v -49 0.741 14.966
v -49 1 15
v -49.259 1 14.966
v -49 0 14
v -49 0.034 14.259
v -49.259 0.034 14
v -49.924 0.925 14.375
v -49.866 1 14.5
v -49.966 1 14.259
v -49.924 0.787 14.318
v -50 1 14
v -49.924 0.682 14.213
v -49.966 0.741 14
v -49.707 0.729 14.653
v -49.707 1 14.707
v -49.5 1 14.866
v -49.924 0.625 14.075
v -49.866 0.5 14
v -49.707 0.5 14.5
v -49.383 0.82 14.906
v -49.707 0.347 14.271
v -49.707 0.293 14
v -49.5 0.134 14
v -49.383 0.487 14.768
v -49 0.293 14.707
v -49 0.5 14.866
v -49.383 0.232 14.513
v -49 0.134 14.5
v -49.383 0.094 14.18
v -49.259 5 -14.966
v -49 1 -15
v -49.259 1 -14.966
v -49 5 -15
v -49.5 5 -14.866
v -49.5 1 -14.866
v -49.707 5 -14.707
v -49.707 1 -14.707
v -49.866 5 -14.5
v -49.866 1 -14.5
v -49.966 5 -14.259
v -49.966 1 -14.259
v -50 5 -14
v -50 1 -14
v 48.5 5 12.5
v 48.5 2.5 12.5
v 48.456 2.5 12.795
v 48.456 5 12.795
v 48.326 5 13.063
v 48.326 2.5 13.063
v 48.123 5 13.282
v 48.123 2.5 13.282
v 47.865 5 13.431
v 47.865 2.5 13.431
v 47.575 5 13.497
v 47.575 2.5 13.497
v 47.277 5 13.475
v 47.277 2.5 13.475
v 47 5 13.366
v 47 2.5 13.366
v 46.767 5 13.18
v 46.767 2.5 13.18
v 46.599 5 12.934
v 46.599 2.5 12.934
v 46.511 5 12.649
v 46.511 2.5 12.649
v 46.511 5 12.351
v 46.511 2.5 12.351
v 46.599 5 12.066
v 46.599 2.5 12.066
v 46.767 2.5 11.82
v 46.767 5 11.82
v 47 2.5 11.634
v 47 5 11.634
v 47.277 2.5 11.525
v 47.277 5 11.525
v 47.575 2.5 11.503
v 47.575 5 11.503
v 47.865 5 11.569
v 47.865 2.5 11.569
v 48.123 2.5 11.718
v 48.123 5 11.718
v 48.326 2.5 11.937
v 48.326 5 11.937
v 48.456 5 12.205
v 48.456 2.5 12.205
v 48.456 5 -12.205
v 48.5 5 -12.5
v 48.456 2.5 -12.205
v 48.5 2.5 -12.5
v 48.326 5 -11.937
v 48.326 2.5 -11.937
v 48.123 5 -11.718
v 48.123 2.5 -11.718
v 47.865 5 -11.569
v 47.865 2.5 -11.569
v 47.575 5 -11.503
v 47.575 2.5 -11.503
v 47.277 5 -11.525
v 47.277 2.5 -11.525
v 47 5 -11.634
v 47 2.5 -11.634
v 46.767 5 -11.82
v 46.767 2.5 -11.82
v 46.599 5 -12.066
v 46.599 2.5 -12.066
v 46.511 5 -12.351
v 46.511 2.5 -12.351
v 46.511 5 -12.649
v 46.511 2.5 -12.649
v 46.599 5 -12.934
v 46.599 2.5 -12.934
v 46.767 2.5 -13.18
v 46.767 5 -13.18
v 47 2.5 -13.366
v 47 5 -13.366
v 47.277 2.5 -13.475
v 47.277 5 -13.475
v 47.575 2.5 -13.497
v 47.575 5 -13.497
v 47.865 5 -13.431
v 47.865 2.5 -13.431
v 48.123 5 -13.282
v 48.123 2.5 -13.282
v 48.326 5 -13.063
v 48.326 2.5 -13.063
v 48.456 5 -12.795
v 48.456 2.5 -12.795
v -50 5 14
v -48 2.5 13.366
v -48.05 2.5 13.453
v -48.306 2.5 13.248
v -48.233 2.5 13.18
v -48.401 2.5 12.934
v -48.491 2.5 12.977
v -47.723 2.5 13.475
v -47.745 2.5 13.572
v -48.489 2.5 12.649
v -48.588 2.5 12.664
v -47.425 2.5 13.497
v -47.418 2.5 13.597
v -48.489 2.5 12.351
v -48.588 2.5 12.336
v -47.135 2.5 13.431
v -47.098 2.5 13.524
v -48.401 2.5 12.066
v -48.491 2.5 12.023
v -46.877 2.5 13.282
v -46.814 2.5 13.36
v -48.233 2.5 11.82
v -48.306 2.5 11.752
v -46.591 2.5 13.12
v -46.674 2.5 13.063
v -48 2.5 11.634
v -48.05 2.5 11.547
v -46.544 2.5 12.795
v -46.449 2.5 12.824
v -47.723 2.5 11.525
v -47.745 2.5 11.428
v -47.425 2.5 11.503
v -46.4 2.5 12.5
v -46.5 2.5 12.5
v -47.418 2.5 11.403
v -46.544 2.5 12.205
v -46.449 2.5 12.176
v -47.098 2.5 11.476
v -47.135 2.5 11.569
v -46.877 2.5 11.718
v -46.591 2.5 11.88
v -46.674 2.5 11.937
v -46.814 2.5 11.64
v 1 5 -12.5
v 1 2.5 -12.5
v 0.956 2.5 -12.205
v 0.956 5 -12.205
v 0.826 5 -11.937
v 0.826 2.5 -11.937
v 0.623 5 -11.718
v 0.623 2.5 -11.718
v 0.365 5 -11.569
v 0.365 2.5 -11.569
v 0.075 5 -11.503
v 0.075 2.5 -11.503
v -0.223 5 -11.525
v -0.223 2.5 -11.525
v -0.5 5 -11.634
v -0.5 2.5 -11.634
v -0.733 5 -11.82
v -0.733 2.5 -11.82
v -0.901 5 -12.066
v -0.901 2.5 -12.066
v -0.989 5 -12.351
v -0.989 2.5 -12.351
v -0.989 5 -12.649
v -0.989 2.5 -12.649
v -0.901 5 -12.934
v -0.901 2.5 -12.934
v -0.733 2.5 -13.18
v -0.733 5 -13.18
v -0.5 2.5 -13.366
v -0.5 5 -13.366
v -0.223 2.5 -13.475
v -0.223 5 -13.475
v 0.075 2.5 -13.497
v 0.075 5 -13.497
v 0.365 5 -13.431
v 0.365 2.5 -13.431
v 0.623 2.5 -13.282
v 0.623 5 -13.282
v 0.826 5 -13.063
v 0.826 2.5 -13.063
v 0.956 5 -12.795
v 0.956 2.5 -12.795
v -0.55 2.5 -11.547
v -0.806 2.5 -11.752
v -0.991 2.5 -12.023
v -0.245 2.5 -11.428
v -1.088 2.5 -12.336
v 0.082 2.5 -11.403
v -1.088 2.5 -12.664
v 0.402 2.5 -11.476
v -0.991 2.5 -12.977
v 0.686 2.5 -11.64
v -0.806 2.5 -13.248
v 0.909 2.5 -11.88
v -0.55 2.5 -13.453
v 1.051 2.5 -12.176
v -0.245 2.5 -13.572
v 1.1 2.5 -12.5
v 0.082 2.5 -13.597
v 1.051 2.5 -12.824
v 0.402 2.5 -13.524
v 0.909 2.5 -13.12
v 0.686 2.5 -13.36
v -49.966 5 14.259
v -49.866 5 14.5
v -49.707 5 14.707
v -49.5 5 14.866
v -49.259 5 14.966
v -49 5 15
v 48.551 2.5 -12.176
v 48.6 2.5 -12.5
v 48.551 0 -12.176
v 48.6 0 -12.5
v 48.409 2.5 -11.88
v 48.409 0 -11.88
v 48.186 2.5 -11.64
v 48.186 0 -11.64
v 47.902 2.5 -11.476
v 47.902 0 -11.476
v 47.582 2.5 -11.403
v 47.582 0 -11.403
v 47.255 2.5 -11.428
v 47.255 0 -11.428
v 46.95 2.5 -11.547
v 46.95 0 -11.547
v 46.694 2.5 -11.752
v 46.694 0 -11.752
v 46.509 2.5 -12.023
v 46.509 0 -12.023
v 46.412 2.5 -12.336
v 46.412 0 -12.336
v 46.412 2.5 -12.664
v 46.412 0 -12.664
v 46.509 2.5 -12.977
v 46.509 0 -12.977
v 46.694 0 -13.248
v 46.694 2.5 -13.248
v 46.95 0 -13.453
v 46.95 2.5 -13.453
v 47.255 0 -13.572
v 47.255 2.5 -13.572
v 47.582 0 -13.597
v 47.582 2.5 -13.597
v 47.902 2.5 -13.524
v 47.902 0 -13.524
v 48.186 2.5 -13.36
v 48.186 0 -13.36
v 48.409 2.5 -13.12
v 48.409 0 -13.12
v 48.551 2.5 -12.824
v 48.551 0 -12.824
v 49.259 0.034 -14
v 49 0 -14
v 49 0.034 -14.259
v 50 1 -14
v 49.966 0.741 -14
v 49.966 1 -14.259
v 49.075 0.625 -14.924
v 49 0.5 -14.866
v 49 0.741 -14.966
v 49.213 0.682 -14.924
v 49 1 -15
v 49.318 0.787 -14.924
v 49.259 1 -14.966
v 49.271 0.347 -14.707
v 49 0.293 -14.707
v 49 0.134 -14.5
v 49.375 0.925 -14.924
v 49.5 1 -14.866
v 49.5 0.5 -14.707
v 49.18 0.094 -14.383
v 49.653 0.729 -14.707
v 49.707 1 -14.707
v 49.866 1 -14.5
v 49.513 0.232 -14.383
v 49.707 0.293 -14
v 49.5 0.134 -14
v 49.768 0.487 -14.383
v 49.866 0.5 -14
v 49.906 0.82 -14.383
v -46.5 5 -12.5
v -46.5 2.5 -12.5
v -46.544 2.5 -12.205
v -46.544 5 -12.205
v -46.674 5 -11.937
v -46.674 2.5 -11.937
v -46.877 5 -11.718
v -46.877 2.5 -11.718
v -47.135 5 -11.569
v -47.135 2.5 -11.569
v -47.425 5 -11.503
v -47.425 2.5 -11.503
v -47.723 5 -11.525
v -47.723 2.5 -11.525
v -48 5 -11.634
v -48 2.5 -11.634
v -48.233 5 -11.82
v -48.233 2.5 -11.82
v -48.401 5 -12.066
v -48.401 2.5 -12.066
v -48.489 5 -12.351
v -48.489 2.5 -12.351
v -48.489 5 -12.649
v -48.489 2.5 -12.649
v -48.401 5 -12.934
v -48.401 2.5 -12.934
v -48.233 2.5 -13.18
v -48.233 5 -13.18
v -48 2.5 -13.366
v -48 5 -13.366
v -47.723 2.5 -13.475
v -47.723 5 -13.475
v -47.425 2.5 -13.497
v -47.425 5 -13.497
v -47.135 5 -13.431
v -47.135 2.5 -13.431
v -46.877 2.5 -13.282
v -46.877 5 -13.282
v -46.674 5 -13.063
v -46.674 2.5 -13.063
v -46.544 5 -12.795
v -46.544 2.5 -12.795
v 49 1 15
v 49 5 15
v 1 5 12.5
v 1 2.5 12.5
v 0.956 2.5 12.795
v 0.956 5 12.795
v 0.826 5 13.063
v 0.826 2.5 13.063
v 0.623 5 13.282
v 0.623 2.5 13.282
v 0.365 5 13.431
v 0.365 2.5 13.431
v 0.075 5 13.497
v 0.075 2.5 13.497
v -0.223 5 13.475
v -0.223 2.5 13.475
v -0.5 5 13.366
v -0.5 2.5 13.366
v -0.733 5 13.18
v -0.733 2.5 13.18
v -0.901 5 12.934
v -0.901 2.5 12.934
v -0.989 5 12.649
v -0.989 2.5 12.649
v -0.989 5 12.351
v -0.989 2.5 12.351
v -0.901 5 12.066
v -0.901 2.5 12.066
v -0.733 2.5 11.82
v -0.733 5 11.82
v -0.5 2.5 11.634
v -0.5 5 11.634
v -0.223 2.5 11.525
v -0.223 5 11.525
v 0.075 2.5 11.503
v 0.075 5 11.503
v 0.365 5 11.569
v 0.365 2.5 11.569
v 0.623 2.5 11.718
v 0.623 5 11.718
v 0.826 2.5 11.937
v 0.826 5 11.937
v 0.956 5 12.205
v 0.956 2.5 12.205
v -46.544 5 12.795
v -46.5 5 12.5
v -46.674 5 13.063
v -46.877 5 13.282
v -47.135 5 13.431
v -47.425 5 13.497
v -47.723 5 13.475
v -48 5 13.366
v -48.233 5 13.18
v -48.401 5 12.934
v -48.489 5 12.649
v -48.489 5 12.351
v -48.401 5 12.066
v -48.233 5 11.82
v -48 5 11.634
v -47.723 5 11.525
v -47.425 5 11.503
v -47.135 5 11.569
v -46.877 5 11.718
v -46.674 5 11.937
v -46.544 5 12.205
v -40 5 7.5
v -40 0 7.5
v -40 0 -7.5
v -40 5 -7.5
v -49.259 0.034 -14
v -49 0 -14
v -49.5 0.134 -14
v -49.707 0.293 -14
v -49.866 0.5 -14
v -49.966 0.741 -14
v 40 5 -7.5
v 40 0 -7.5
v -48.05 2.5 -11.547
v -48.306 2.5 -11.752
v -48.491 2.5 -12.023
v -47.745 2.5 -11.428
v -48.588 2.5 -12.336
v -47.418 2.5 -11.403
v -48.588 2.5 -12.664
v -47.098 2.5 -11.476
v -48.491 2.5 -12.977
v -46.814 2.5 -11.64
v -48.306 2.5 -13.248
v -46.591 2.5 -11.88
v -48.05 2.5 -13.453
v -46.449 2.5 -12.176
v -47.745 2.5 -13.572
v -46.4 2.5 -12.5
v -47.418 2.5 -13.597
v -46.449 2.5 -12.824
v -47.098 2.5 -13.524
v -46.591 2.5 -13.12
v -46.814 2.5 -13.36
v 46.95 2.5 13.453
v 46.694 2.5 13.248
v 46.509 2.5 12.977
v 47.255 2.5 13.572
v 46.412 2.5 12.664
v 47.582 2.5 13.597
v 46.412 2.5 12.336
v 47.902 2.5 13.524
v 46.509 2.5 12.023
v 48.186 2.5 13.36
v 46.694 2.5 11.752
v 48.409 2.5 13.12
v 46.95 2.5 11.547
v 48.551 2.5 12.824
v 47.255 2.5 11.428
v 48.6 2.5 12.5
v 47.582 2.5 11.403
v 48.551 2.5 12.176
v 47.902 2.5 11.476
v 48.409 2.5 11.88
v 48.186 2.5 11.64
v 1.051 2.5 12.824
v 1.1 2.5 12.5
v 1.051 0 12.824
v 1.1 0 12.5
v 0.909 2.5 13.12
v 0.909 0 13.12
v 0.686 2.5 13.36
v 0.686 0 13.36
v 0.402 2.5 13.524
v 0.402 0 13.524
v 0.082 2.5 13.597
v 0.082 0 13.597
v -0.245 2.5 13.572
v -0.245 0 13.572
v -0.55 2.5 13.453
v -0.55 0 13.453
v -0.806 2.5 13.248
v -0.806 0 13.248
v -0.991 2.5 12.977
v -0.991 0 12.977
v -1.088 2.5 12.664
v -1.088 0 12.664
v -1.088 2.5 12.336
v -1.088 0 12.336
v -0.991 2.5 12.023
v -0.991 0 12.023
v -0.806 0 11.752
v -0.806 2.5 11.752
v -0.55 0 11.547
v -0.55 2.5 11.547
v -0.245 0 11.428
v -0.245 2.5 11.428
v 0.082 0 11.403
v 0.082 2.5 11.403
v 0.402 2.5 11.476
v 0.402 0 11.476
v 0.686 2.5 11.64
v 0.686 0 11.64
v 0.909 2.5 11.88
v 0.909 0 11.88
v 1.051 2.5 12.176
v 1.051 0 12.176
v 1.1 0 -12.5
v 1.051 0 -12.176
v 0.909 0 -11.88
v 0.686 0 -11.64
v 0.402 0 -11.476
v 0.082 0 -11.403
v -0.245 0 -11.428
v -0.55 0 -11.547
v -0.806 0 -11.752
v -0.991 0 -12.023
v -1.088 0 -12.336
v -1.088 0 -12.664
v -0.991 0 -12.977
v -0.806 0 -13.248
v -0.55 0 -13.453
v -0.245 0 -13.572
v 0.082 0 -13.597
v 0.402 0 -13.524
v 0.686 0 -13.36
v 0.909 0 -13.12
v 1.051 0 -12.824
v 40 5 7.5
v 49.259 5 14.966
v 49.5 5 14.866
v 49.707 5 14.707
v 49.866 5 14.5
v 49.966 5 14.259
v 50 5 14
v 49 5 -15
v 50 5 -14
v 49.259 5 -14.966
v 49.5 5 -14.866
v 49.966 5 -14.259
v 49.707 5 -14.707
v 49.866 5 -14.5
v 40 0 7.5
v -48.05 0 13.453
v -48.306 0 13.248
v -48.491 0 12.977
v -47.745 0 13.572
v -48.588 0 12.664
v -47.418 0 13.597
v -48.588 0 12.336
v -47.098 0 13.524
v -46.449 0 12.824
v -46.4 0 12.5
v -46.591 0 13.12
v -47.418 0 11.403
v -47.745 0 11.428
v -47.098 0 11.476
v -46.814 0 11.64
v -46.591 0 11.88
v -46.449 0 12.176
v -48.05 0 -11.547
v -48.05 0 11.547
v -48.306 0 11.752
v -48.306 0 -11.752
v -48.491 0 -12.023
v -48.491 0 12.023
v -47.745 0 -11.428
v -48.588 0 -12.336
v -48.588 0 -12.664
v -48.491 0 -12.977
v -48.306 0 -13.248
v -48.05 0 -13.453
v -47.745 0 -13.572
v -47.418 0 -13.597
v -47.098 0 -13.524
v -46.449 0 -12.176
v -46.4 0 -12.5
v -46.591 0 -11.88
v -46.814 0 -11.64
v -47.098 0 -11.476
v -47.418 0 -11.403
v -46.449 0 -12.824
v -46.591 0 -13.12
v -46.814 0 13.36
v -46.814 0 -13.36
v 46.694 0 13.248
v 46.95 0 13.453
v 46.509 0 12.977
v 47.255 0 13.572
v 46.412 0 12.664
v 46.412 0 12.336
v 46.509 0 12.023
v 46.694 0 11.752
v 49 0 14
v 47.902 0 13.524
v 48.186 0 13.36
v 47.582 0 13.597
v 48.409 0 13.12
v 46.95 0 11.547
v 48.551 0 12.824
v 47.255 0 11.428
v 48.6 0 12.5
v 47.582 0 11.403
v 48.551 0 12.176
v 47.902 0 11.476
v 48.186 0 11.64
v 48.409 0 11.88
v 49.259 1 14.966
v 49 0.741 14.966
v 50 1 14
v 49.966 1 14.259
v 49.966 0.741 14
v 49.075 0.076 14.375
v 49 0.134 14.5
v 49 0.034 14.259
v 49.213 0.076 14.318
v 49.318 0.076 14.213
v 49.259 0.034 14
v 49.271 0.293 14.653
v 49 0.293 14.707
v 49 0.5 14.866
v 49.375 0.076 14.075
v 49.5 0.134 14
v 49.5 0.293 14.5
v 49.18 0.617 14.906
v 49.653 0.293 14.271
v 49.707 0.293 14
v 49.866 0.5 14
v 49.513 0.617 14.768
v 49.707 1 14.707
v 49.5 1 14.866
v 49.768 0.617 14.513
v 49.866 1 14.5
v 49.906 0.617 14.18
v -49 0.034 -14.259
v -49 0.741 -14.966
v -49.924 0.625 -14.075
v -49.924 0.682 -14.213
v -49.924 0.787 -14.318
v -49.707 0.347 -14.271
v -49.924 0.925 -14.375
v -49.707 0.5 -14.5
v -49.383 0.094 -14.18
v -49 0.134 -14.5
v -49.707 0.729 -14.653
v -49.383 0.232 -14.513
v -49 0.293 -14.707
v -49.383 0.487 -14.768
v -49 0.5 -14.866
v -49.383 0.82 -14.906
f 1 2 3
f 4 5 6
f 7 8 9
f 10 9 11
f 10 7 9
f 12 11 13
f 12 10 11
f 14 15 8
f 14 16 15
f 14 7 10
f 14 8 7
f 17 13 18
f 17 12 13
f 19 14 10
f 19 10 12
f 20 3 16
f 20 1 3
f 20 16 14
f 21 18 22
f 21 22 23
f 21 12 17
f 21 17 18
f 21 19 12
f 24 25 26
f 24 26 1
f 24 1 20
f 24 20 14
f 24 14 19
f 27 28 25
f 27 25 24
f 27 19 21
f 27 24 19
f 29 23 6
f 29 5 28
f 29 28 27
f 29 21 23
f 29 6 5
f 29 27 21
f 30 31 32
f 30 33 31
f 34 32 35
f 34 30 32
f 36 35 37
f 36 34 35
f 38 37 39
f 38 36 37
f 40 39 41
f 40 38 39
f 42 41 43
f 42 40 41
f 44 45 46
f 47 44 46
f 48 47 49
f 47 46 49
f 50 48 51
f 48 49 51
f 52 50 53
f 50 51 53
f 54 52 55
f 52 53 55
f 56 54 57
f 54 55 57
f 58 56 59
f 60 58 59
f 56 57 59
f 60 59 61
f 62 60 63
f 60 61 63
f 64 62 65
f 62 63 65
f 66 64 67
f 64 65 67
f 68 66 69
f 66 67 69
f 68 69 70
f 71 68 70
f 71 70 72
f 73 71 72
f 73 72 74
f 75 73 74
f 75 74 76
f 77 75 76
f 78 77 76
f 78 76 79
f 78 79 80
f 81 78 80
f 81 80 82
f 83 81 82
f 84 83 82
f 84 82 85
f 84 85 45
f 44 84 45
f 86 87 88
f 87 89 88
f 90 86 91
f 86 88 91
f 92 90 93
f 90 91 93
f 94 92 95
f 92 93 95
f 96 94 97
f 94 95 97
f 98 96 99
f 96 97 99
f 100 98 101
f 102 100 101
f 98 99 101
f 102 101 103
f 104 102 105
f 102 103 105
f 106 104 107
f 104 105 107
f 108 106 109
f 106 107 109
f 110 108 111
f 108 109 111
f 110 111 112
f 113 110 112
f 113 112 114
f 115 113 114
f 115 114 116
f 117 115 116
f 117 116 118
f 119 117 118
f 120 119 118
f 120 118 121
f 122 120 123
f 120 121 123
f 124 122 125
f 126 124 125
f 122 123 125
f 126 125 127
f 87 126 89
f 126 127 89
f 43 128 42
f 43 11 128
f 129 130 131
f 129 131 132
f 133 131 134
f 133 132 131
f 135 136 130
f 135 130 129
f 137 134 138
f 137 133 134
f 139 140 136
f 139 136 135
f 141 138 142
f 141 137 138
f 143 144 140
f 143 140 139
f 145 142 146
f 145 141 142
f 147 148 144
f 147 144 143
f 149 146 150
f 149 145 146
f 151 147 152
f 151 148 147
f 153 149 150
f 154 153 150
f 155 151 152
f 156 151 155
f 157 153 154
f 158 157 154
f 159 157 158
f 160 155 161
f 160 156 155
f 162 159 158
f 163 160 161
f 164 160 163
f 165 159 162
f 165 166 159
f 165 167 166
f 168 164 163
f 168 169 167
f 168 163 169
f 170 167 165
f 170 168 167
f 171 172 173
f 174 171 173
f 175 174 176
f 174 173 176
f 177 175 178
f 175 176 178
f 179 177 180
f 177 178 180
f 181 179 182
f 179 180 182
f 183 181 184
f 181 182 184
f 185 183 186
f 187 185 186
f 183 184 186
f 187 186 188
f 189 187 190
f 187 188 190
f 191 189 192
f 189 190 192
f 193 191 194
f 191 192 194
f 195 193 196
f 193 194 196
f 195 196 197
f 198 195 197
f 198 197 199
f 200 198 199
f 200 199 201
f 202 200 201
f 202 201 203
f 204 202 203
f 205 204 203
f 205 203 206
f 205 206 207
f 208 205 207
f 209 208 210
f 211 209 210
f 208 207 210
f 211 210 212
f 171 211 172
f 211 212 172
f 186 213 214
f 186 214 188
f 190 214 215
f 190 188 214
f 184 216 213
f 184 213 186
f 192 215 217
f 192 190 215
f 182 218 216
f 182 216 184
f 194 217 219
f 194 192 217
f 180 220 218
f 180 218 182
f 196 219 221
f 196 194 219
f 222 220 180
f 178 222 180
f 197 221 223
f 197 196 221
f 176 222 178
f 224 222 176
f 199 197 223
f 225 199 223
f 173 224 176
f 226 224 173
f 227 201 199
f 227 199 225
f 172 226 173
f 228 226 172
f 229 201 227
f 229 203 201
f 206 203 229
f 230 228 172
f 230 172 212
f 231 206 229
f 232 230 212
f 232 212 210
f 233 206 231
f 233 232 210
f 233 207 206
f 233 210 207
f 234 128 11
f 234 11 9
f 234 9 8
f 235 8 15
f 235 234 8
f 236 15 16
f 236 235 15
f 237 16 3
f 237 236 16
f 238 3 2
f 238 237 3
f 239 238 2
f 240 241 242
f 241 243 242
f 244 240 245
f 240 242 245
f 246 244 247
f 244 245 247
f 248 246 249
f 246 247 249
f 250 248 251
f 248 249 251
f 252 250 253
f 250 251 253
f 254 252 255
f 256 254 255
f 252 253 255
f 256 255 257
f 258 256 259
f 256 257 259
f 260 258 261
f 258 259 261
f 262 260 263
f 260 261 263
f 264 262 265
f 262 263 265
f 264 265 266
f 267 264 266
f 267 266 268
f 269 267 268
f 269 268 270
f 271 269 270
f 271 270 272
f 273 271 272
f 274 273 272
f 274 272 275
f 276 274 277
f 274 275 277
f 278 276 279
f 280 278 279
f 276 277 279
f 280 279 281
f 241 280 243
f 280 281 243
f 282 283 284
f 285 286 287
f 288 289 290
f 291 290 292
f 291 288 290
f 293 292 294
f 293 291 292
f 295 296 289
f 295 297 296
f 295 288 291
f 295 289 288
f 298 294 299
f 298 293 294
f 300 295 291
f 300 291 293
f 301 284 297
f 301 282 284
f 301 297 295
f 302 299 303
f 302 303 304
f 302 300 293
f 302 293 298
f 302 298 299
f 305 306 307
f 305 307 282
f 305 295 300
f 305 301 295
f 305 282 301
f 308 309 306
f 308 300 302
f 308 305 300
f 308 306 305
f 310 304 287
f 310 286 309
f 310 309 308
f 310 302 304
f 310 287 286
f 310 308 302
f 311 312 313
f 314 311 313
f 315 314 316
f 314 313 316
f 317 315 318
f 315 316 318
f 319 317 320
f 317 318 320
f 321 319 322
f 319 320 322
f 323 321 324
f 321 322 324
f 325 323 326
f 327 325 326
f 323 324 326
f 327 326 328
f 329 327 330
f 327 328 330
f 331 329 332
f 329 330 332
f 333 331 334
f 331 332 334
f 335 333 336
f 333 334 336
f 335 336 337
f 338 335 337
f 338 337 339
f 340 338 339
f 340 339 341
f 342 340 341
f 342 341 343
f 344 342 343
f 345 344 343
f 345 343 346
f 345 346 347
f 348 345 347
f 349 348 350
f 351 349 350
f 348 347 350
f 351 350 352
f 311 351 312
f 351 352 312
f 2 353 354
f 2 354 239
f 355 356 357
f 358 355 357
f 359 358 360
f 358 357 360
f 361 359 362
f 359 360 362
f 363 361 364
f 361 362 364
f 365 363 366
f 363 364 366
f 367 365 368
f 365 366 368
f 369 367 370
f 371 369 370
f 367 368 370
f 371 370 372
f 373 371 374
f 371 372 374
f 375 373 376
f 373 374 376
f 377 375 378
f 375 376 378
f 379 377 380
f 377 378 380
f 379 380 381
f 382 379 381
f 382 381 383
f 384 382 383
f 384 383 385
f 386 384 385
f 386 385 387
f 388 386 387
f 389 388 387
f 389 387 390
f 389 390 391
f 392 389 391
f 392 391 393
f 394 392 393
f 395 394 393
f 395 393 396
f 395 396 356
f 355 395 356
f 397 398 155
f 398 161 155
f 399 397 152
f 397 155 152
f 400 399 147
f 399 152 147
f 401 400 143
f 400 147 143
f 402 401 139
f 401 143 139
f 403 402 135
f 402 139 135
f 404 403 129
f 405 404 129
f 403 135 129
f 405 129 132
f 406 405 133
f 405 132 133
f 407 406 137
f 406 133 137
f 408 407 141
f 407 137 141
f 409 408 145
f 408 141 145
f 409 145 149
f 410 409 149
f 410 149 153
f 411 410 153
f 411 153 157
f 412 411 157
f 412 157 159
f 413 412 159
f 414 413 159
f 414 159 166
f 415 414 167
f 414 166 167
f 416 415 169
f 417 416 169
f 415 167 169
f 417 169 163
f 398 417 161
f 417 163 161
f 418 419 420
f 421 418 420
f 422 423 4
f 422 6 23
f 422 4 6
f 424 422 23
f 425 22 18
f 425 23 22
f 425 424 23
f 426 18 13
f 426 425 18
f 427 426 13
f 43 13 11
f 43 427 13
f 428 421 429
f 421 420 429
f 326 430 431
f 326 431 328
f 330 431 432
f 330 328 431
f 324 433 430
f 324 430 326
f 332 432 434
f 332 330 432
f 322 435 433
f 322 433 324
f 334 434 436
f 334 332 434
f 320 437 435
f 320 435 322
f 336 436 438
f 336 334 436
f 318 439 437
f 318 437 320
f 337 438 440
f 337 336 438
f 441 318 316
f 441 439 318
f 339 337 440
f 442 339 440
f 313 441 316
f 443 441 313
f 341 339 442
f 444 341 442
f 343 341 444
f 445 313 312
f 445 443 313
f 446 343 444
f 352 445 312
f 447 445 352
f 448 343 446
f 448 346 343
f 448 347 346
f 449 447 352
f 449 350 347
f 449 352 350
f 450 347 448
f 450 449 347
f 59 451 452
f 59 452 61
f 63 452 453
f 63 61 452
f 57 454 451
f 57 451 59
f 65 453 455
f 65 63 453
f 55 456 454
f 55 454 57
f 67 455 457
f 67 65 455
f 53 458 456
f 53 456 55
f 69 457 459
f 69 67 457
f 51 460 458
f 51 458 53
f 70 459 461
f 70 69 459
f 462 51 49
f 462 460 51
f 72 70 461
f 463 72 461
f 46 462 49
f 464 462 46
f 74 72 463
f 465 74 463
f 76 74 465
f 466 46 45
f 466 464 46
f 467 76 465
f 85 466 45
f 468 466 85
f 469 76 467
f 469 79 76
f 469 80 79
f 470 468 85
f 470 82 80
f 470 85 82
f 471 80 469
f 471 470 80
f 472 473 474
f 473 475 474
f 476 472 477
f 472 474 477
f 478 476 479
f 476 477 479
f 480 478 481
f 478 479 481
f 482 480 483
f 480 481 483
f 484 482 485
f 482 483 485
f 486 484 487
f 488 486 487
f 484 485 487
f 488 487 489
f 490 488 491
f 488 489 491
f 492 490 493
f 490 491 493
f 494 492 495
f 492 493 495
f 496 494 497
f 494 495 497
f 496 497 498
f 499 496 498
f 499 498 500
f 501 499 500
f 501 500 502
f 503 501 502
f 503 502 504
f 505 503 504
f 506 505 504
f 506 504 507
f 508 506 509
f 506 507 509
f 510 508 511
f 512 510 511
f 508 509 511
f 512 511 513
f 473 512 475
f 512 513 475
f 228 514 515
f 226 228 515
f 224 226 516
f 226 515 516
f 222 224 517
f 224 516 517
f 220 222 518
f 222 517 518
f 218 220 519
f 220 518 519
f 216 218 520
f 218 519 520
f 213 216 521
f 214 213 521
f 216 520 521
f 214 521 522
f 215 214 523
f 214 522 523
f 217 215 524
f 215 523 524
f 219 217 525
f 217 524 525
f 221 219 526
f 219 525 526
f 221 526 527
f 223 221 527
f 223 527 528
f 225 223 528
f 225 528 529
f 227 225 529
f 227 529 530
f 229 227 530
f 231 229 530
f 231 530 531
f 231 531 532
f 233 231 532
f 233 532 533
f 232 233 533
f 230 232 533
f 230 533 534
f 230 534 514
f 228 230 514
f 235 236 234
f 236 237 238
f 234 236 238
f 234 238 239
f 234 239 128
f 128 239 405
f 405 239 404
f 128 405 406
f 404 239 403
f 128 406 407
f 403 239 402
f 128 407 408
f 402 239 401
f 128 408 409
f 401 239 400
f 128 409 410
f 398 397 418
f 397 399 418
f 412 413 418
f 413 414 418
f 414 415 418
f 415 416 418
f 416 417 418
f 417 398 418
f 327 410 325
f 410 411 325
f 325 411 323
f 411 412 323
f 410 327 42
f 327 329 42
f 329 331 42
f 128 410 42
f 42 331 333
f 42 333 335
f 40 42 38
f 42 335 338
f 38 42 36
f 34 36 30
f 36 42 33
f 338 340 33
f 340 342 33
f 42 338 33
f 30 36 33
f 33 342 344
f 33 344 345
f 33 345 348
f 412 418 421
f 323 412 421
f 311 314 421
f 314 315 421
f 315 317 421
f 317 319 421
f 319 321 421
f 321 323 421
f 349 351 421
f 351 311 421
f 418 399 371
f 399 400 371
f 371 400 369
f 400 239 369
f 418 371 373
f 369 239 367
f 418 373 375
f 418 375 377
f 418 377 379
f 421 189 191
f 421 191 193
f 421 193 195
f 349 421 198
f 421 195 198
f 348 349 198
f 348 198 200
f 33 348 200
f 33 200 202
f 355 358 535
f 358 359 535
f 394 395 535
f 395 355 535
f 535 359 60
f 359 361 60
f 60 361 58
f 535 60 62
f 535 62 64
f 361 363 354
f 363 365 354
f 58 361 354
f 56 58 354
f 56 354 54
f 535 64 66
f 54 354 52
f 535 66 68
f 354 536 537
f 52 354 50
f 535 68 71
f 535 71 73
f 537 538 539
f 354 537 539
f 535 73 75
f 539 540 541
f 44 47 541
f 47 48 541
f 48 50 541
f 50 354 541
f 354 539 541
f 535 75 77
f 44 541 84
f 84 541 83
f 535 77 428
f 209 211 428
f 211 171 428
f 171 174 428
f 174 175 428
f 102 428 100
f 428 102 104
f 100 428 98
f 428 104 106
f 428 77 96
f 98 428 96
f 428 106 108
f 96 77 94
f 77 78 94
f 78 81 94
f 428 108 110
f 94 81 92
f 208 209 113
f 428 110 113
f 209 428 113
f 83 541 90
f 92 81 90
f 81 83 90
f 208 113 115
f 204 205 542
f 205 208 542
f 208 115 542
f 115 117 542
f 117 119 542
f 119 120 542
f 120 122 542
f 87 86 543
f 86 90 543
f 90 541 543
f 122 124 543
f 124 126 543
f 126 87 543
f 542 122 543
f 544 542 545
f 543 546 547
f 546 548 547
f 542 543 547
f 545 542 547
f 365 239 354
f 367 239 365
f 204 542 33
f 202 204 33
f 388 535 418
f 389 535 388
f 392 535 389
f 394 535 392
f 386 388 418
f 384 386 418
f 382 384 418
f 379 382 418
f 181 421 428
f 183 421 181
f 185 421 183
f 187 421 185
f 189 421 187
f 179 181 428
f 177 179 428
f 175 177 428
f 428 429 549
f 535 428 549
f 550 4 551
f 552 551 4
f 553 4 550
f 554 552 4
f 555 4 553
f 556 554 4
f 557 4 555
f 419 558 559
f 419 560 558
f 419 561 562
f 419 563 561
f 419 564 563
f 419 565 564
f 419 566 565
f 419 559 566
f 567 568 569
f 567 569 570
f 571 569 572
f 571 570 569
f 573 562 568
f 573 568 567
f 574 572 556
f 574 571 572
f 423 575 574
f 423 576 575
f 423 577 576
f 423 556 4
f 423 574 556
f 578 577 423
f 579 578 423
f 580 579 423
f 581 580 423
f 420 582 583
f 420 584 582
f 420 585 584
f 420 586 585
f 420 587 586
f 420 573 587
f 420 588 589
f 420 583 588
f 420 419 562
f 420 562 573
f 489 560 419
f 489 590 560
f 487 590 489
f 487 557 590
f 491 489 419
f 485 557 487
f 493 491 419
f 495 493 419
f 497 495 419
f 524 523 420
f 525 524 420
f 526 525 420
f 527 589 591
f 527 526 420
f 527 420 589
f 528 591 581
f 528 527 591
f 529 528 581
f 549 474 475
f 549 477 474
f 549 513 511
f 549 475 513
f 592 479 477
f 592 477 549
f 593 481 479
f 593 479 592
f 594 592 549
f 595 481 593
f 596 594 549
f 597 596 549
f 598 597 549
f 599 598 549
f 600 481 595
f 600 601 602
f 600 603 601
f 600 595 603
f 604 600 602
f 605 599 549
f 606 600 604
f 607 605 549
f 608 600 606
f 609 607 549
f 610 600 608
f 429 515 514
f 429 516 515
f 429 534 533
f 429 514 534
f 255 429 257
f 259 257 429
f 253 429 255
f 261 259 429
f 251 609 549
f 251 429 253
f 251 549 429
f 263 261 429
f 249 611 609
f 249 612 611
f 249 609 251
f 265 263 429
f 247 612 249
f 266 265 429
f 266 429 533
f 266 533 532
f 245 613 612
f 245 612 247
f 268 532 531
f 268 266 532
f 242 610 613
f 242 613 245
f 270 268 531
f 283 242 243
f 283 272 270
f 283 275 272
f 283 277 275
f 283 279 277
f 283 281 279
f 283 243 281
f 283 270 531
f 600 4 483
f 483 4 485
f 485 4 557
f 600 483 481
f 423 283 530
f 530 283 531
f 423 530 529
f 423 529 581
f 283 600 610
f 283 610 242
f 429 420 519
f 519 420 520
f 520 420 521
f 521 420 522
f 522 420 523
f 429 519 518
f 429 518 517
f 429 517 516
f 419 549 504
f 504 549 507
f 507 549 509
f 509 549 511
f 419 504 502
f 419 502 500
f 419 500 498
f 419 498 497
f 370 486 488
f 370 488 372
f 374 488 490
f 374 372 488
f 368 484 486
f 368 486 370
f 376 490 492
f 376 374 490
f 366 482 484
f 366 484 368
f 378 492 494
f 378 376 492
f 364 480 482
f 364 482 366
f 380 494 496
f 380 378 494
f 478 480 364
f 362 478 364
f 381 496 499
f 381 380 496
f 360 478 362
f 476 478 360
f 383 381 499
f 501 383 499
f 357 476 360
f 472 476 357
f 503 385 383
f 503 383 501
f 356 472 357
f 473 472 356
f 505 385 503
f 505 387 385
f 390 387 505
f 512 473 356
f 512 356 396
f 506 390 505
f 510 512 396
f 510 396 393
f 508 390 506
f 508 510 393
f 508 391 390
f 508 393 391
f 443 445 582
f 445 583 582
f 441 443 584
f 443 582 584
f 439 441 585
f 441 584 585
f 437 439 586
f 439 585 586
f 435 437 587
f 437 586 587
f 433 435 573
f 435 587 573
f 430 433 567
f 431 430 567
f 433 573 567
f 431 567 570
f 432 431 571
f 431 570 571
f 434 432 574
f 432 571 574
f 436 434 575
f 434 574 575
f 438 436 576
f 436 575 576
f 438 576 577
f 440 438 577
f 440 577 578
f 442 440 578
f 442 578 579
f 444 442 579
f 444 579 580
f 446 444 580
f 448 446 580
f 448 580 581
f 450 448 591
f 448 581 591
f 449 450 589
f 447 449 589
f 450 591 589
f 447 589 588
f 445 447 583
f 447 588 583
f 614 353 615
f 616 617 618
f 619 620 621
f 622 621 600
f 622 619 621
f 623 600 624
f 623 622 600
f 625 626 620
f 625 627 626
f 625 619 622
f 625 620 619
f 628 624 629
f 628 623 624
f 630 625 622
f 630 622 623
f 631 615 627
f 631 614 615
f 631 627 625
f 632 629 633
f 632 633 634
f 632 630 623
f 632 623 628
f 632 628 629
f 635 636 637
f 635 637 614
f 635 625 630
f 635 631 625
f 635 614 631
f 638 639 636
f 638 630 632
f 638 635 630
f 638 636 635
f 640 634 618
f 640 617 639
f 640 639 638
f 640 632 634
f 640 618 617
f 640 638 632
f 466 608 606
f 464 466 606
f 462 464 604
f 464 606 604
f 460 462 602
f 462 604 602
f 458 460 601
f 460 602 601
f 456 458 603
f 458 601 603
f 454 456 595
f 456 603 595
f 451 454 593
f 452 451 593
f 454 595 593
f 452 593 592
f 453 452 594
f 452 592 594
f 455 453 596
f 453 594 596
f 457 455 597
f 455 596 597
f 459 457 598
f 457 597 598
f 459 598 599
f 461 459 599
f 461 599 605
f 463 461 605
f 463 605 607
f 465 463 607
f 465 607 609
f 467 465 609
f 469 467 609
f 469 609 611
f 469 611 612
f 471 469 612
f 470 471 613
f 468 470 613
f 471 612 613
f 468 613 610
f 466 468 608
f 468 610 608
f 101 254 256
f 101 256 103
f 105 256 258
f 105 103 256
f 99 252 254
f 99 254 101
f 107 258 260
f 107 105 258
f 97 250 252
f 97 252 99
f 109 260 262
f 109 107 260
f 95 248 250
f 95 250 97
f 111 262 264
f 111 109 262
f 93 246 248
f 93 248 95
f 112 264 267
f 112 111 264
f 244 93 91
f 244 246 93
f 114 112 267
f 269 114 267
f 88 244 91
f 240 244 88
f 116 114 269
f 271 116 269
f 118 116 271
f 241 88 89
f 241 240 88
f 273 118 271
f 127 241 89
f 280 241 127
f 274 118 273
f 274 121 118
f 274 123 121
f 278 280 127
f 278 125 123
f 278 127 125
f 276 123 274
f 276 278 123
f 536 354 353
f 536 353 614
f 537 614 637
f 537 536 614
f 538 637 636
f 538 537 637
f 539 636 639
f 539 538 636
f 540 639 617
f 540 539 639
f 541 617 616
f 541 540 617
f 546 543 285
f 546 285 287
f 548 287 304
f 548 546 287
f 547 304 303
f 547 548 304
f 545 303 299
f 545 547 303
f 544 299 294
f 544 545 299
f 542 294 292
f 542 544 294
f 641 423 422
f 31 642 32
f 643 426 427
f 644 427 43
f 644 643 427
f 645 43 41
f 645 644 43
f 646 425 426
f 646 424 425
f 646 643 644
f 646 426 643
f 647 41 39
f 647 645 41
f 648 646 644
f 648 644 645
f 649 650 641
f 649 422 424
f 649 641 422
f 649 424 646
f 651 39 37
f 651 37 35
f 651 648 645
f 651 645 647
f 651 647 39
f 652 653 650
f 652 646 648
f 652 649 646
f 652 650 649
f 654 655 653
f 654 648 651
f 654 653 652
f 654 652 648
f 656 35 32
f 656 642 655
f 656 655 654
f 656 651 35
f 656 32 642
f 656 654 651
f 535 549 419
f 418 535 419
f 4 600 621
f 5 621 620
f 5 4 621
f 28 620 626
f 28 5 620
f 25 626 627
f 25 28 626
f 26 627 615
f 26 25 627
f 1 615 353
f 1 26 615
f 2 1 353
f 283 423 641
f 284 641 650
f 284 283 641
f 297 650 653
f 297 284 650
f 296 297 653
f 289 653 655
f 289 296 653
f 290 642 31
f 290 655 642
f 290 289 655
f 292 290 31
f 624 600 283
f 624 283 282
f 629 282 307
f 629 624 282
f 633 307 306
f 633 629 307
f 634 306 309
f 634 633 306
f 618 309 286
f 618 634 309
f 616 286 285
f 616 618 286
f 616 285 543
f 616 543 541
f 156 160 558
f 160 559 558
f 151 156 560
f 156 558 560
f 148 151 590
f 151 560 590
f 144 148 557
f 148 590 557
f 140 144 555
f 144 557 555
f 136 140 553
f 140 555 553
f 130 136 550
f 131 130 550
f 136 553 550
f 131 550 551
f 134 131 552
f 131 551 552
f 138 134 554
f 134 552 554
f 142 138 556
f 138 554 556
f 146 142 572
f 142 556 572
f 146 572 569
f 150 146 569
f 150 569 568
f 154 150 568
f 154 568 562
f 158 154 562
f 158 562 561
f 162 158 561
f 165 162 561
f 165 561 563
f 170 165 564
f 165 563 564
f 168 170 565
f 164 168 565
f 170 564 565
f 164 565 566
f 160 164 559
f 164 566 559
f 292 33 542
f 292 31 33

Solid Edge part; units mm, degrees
sketch "Sketch1" plane through (0, 0, 0) normal (0, -1, 0) x (1, 0, 0)
  line L0 (50, 15) -> (-50, 15)
  line L1 (-50, 15) -> (-50, -15)
  line L2 (-50, -15) -> (50, -15)
  line L3 (50, -15) -> (50, 15)
extrude "Protrusion1" add sketch "Sketch1" against normal blind 5
sketch "Sketch2" plane through (0, 0, 0) normal (0, -1, 0) x (1, 0, 0)
  circle A0 centre (47.5, 12.5) radius 1
  circle A1 centre (-47.5, 12.5) radius 1
  circle A2 centre (-47.5, -12.5) radius 1
  circle A3 centre (47.5, -12.5) radius 1
  circle A4 centre (0, -12.5) radius 1
  circle A5 centre (0, 12.5) radius 1
extrude "ExtrudedCutout_1" cut sketch "Sketch2" against normal blind 5
sketch "Sketch3" plane through (0, 0, 0) normal (0, -1, 0) x (1, 0, 0)
  circle A0 centre (47.5, 12.5) radius 1.1
  circle A1 centre (-47.5, 12.5) radius 1.1
  circle A2 centre (-47.5, -12.5) radius 1.1
  circle A3 centre (47.5, -12.5) radius 1.1
  circle A4 centre (0, 12.5) radius 1.1
  circle A5 centre (0, -12.5) radius 1.1
extrude "ExtrudedCutout_2" cut sketch "Sketch3" against normal blind 2.5
fillet "Round_1" radius 1 8 edges at (50, 2.5, 15) (50, 0, 0) (0, 0, 15) (50, 2.5, -15) (0, 0, -15) (-50, 2.5, -15) (-50, 0, 0) (-50, 2.5, 15)
sketch "Sketch4" plane through (0, 0, 0) normal (0, -1, 0) x (-1, 0, 0)
  line L0 (-40, -7.5) -> (40, -7.5)
  line L1 (40, -7.5) -> (40, 7.5)
  line L2 (40, 7.5) -> (-40, 7.5)
  line L3 (-40, 7.5) -> (-40, -7.5)
extrude "ExtrudedCutout_3" cut sketch "Sketch4" against normal blind 5
